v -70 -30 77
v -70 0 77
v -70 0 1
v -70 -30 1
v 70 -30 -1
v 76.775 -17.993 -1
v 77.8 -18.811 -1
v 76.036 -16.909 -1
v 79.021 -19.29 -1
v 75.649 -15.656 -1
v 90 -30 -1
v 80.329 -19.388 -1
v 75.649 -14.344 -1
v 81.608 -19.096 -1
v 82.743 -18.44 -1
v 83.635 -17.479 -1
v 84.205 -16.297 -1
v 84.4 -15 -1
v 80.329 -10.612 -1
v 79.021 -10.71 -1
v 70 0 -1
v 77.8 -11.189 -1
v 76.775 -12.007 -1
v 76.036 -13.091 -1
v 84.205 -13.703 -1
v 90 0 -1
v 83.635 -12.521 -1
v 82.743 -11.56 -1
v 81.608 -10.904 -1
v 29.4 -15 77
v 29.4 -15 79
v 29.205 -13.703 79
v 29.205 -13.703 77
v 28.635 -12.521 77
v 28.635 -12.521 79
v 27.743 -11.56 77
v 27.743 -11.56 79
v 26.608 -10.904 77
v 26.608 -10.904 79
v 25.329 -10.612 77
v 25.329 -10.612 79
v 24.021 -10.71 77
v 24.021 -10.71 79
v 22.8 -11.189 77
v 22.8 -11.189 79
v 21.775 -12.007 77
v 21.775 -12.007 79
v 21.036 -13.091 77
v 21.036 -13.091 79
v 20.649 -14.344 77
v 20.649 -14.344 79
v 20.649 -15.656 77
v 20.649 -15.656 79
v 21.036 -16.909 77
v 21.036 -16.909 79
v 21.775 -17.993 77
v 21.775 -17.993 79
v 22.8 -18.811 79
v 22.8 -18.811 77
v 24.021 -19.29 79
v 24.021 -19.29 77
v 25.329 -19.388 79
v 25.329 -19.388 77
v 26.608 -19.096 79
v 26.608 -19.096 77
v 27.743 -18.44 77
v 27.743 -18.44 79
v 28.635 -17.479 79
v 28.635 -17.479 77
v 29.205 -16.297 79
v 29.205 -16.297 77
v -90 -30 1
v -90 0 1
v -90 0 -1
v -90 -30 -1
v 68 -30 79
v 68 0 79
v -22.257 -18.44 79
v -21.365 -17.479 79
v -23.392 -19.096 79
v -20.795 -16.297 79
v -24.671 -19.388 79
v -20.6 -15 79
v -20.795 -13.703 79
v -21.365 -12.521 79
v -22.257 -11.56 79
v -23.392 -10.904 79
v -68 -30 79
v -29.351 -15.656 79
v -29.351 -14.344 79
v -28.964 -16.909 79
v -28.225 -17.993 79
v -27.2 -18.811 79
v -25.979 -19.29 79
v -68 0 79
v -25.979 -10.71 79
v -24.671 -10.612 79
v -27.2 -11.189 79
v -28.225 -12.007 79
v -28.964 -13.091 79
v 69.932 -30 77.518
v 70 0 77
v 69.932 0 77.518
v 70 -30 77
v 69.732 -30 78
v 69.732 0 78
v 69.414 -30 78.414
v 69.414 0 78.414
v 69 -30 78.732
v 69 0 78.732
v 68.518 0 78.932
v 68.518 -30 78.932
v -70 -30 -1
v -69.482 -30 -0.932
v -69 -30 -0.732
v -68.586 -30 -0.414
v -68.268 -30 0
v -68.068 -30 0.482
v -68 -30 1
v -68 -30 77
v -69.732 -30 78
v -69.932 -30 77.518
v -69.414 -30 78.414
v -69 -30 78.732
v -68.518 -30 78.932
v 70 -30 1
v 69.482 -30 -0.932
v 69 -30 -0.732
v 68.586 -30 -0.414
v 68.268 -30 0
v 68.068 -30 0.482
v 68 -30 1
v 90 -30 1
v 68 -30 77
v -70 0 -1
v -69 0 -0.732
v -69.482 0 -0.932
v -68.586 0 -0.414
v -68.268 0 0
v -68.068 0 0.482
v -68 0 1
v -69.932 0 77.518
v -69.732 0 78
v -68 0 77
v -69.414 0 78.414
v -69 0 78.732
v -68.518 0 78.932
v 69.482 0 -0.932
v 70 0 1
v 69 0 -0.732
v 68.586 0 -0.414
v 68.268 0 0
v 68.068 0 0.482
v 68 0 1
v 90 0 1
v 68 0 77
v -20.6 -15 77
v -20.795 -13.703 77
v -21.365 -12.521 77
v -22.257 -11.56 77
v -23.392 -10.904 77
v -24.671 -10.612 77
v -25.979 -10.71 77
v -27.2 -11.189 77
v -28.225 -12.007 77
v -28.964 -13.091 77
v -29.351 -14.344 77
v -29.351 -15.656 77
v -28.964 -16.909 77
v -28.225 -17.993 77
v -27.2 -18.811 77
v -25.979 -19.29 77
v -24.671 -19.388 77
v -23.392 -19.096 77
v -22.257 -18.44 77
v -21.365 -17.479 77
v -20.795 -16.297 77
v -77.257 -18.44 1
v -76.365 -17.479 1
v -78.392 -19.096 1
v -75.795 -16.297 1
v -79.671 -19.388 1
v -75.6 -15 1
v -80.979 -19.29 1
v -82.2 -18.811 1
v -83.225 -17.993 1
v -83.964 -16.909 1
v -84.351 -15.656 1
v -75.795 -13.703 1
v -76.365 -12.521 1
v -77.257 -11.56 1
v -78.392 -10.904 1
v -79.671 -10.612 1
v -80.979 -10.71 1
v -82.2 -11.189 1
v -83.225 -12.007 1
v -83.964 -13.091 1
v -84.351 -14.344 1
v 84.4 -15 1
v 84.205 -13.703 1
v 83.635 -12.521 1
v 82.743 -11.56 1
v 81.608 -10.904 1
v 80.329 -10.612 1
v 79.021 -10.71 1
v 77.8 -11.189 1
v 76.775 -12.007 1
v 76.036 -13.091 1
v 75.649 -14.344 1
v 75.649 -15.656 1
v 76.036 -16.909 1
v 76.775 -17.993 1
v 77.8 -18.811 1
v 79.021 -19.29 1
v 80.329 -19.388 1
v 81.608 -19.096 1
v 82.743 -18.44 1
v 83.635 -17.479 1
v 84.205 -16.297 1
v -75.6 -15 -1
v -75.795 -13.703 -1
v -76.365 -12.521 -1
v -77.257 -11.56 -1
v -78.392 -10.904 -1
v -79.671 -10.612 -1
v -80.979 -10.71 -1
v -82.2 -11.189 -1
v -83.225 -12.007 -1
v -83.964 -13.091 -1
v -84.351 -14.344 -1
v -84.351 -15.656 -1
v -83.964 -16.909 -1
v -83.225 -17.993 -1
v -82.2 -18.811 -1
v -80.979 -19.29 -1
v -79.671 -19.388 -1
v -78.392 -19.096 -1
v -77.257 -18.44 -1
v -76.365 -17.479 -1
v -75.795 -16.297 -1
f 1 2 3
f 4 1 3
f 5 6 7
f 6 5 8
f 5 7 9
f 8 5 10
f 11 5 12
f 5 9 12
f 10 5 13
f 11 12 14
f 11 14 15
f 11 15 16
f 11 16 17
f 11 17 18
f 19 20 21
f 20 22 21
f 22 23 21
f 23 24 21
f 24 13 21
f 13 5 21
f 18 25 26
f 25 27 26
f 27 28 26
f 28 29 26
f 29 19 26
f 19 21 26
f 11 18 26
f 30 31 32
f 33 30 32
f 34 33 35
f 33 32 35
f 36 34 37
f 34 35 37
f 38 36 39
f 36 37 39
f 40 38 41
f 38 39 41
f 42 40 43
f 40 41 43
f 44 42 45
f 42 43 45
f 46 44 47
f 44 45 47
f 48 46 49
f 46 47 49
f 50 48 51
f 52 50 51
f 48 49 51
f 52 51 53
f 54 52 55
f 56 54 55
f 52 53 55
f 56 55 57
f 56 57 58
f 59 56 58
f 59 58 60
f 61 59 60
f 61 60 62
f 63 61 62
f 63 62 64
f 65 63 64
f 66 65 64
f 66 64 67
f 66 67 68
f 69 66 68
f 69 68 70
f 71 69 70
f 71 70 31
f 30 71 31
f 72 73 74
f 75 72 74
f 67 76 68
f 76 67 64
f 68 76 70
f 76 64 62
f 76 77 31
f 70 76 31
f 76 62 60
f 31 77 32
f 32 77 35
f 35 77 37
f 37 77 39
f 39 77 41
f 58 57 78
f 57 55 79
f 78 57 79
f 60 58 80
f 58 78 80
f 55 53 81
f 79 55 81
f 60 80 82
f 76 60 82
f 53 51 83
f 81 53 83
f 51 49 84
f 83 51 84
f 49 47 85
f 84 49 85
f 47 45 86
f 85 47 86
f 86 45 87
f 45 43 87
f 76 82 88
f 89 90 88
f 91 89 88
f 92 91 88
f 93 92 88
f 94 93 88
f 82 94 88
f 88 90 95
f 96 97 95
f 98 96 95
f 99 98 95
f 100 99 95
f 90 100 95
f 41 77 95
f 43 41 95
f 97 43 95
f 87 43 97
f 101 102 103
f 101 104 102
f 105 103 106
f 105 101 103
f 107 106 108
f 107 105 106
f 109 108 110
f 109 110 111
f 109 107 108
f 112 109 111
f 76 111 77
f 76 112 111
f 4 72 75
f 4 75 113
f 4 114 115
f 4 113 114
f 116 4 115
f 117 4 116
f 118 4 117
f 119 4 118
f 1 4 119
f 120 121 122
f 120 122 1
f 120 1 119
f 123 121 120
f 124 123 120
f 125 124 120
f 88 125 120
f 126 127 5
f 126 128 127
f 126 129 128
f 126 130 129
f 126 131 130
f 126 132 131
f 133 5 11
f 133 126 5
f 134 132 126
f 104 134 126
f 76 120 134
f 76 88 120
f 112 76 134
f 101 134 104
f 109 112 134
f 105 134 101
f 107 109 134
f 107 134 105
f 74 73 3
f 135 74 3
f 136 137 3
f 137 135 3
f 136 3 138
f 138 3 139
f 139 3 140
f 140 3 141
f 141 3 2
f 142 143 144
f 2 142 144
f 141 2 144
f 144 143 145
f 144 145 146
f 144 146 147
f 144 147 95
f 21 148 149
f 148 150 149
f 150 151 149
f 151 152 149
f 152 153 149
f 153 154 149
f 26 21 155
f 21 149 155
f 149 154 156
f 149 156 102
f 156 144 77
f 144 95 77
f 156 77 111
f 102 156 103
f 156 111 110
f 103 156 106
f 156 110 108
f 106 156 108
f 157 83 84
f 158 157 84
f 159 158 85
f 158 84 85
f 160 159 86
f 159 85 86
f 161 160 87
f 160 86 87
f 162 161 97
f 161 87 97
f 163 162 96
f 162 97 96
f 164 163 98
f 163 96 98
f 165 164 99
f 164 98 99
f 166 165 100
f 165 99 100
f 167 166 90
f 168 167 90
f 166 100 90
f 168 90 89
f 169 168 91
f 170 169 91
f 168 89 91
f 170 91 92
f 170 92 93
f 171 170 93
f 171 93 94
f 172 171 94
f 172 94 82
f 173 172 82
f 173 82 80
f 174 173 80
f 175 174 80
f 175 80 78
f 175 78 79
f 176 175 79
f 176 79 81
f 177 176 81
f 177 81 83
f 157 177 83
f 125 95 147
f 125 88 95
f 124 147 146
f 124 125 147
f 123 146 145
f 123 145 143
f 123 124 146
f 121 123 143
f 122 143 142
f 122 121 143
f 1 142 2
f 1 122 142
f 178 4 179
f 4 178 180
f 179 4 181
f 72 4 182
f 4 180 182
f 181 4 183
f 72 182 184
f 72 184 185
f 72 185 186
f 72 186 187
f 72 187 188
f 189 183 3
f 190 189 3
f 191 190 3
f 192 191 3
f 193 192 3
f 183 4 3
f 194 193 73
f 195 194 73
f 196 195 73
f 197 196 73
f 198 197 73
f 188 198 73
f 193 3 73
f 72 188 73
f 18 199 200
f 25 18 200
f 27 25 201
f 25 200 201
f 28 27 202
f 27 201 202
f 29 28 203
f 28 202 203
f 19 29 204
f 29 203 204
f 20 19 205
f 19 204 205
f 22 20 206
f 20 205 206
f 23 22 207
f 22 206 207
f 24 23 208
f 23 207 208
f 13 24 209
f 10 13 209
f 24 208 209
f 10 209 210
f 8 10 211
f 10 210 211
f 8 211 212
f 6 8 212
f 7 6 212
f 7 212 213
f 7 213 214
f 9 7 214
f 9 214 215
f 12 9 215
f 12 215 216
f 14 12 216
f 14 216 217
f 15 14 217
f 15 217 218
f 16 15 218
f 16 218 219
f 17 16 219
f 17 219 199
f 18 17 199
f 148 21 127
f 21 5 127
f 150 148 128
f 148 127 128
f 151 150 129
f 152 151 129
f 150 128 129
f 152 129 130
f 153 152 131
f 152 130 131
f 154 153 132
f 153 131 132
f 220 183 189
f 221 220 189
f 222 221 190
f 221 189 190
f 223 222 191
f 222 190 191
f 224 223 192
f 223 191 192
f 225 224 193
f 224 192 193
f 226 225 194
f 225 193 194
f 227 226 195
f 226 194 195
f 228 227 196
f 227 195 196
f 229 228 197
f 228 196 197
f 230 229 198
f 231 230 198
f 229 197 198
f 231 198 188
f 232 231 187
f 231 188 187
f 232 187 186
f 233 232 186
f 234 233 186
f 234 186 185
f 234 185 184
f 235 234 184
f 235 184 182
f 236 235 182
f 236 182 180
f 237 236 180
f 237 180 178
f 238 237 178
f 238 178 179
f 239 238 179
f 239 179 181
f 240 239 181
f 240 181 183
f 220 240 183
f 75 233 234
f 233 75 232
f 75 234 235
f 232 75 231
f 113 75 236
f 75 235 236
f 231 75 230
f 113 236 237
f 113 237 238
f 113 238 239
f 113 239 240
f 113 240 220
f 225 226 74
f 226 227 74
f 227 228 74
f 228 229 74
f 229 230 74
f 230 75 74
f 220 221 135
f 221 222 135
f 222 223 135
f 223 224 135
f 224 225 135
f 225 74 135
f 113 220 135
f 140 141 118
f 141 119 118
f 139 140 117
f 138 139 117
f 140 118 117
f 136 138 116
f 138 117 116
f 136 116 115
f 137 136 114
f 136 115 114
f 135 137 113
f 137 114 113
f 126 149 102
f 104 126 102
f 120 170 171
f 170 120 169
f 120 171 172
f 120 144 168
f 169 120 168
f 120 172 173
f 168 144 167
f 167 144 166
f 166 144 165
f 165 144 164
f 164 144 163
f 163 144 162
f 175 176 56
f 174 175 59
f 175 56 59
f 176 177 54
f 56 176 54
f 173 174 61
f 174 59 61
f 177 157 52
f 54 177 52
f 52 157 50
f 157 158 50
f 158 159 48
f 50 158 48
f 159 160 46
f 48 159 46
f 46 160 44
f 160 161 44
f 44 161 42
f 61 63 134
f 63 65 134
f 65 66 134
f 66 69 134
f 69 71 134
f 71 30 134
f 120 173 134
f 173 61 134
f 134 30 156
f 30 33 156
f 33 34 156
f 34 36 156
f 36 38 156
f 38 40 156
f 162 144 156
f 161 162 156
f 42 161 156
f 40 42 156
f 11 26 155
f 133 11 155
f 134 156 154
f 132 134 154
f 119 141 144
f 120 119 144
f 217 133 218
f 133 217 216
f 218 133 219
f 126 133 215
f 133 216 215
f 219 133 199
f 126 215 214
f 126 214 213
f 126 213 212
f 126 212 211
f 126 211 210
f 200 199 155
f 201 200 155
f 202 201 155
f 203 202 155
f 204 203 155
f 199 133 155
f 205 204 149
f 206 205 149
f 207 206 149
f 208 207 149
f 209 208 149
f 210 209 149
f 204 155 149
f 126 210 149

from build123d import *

# Parameters (mm, degrees)
F1_DEPTH = 30
F2_R     = 4.4
F3_R     = 4.4
F4_DEPTH = 25
F5_R     = 2
F6_R     = 2


# Not quite as in the source:
# - a feature names something its author has since deleted; it is built from what else it names


with BuildPart() as f1:
    # F0 (on Front) → F1 (new body)
    with BuildSketch(Plane.XZ):
        Polygon((90, -1), (90, 1), (70, 1), (70, 79), (-70, 79), (-70, 1), (-90, 1), (-90, -1), (-68, -1), (-68, 77), (68, 77), (68, -1), align=None)
    extrude(amount=F1_DEPTH)

    # F2 (on face) + F3 (on face) → F4 (cut)
    with BuildSketch(Plane.XY.offset(1)):
        with Locations((-80, -15)):
            Circle(F2_R)
        with Locations((80, -15)):
            Circle(F2_R)
    with BuildSketch(Plane.XY.offset(79)):
        with Locations((-25, -15)):
            Circle(F3_R)
        with Locations((25, -15)):
            Circle(F3_R)
    extrude(amount=-F4_DEPTH, mode=Mode.SUBTRACT)

    # F5
    f5_edges = [f1.edges().sort_by_distance(p)[0] for p in [
        (-70, -15, 79),
        (70, -15, 79),
    ]]
    fillet(f5_edges, radius=F5_R)

    # F6
    f6_edges = [f1.edges().sort_by_distance(p)[0] for p in [
        (68, -15, -1),
        (-68, -15, -1),
    ]]
    fillet(f6_edges, radius=F6_R)


solid = f1.part
